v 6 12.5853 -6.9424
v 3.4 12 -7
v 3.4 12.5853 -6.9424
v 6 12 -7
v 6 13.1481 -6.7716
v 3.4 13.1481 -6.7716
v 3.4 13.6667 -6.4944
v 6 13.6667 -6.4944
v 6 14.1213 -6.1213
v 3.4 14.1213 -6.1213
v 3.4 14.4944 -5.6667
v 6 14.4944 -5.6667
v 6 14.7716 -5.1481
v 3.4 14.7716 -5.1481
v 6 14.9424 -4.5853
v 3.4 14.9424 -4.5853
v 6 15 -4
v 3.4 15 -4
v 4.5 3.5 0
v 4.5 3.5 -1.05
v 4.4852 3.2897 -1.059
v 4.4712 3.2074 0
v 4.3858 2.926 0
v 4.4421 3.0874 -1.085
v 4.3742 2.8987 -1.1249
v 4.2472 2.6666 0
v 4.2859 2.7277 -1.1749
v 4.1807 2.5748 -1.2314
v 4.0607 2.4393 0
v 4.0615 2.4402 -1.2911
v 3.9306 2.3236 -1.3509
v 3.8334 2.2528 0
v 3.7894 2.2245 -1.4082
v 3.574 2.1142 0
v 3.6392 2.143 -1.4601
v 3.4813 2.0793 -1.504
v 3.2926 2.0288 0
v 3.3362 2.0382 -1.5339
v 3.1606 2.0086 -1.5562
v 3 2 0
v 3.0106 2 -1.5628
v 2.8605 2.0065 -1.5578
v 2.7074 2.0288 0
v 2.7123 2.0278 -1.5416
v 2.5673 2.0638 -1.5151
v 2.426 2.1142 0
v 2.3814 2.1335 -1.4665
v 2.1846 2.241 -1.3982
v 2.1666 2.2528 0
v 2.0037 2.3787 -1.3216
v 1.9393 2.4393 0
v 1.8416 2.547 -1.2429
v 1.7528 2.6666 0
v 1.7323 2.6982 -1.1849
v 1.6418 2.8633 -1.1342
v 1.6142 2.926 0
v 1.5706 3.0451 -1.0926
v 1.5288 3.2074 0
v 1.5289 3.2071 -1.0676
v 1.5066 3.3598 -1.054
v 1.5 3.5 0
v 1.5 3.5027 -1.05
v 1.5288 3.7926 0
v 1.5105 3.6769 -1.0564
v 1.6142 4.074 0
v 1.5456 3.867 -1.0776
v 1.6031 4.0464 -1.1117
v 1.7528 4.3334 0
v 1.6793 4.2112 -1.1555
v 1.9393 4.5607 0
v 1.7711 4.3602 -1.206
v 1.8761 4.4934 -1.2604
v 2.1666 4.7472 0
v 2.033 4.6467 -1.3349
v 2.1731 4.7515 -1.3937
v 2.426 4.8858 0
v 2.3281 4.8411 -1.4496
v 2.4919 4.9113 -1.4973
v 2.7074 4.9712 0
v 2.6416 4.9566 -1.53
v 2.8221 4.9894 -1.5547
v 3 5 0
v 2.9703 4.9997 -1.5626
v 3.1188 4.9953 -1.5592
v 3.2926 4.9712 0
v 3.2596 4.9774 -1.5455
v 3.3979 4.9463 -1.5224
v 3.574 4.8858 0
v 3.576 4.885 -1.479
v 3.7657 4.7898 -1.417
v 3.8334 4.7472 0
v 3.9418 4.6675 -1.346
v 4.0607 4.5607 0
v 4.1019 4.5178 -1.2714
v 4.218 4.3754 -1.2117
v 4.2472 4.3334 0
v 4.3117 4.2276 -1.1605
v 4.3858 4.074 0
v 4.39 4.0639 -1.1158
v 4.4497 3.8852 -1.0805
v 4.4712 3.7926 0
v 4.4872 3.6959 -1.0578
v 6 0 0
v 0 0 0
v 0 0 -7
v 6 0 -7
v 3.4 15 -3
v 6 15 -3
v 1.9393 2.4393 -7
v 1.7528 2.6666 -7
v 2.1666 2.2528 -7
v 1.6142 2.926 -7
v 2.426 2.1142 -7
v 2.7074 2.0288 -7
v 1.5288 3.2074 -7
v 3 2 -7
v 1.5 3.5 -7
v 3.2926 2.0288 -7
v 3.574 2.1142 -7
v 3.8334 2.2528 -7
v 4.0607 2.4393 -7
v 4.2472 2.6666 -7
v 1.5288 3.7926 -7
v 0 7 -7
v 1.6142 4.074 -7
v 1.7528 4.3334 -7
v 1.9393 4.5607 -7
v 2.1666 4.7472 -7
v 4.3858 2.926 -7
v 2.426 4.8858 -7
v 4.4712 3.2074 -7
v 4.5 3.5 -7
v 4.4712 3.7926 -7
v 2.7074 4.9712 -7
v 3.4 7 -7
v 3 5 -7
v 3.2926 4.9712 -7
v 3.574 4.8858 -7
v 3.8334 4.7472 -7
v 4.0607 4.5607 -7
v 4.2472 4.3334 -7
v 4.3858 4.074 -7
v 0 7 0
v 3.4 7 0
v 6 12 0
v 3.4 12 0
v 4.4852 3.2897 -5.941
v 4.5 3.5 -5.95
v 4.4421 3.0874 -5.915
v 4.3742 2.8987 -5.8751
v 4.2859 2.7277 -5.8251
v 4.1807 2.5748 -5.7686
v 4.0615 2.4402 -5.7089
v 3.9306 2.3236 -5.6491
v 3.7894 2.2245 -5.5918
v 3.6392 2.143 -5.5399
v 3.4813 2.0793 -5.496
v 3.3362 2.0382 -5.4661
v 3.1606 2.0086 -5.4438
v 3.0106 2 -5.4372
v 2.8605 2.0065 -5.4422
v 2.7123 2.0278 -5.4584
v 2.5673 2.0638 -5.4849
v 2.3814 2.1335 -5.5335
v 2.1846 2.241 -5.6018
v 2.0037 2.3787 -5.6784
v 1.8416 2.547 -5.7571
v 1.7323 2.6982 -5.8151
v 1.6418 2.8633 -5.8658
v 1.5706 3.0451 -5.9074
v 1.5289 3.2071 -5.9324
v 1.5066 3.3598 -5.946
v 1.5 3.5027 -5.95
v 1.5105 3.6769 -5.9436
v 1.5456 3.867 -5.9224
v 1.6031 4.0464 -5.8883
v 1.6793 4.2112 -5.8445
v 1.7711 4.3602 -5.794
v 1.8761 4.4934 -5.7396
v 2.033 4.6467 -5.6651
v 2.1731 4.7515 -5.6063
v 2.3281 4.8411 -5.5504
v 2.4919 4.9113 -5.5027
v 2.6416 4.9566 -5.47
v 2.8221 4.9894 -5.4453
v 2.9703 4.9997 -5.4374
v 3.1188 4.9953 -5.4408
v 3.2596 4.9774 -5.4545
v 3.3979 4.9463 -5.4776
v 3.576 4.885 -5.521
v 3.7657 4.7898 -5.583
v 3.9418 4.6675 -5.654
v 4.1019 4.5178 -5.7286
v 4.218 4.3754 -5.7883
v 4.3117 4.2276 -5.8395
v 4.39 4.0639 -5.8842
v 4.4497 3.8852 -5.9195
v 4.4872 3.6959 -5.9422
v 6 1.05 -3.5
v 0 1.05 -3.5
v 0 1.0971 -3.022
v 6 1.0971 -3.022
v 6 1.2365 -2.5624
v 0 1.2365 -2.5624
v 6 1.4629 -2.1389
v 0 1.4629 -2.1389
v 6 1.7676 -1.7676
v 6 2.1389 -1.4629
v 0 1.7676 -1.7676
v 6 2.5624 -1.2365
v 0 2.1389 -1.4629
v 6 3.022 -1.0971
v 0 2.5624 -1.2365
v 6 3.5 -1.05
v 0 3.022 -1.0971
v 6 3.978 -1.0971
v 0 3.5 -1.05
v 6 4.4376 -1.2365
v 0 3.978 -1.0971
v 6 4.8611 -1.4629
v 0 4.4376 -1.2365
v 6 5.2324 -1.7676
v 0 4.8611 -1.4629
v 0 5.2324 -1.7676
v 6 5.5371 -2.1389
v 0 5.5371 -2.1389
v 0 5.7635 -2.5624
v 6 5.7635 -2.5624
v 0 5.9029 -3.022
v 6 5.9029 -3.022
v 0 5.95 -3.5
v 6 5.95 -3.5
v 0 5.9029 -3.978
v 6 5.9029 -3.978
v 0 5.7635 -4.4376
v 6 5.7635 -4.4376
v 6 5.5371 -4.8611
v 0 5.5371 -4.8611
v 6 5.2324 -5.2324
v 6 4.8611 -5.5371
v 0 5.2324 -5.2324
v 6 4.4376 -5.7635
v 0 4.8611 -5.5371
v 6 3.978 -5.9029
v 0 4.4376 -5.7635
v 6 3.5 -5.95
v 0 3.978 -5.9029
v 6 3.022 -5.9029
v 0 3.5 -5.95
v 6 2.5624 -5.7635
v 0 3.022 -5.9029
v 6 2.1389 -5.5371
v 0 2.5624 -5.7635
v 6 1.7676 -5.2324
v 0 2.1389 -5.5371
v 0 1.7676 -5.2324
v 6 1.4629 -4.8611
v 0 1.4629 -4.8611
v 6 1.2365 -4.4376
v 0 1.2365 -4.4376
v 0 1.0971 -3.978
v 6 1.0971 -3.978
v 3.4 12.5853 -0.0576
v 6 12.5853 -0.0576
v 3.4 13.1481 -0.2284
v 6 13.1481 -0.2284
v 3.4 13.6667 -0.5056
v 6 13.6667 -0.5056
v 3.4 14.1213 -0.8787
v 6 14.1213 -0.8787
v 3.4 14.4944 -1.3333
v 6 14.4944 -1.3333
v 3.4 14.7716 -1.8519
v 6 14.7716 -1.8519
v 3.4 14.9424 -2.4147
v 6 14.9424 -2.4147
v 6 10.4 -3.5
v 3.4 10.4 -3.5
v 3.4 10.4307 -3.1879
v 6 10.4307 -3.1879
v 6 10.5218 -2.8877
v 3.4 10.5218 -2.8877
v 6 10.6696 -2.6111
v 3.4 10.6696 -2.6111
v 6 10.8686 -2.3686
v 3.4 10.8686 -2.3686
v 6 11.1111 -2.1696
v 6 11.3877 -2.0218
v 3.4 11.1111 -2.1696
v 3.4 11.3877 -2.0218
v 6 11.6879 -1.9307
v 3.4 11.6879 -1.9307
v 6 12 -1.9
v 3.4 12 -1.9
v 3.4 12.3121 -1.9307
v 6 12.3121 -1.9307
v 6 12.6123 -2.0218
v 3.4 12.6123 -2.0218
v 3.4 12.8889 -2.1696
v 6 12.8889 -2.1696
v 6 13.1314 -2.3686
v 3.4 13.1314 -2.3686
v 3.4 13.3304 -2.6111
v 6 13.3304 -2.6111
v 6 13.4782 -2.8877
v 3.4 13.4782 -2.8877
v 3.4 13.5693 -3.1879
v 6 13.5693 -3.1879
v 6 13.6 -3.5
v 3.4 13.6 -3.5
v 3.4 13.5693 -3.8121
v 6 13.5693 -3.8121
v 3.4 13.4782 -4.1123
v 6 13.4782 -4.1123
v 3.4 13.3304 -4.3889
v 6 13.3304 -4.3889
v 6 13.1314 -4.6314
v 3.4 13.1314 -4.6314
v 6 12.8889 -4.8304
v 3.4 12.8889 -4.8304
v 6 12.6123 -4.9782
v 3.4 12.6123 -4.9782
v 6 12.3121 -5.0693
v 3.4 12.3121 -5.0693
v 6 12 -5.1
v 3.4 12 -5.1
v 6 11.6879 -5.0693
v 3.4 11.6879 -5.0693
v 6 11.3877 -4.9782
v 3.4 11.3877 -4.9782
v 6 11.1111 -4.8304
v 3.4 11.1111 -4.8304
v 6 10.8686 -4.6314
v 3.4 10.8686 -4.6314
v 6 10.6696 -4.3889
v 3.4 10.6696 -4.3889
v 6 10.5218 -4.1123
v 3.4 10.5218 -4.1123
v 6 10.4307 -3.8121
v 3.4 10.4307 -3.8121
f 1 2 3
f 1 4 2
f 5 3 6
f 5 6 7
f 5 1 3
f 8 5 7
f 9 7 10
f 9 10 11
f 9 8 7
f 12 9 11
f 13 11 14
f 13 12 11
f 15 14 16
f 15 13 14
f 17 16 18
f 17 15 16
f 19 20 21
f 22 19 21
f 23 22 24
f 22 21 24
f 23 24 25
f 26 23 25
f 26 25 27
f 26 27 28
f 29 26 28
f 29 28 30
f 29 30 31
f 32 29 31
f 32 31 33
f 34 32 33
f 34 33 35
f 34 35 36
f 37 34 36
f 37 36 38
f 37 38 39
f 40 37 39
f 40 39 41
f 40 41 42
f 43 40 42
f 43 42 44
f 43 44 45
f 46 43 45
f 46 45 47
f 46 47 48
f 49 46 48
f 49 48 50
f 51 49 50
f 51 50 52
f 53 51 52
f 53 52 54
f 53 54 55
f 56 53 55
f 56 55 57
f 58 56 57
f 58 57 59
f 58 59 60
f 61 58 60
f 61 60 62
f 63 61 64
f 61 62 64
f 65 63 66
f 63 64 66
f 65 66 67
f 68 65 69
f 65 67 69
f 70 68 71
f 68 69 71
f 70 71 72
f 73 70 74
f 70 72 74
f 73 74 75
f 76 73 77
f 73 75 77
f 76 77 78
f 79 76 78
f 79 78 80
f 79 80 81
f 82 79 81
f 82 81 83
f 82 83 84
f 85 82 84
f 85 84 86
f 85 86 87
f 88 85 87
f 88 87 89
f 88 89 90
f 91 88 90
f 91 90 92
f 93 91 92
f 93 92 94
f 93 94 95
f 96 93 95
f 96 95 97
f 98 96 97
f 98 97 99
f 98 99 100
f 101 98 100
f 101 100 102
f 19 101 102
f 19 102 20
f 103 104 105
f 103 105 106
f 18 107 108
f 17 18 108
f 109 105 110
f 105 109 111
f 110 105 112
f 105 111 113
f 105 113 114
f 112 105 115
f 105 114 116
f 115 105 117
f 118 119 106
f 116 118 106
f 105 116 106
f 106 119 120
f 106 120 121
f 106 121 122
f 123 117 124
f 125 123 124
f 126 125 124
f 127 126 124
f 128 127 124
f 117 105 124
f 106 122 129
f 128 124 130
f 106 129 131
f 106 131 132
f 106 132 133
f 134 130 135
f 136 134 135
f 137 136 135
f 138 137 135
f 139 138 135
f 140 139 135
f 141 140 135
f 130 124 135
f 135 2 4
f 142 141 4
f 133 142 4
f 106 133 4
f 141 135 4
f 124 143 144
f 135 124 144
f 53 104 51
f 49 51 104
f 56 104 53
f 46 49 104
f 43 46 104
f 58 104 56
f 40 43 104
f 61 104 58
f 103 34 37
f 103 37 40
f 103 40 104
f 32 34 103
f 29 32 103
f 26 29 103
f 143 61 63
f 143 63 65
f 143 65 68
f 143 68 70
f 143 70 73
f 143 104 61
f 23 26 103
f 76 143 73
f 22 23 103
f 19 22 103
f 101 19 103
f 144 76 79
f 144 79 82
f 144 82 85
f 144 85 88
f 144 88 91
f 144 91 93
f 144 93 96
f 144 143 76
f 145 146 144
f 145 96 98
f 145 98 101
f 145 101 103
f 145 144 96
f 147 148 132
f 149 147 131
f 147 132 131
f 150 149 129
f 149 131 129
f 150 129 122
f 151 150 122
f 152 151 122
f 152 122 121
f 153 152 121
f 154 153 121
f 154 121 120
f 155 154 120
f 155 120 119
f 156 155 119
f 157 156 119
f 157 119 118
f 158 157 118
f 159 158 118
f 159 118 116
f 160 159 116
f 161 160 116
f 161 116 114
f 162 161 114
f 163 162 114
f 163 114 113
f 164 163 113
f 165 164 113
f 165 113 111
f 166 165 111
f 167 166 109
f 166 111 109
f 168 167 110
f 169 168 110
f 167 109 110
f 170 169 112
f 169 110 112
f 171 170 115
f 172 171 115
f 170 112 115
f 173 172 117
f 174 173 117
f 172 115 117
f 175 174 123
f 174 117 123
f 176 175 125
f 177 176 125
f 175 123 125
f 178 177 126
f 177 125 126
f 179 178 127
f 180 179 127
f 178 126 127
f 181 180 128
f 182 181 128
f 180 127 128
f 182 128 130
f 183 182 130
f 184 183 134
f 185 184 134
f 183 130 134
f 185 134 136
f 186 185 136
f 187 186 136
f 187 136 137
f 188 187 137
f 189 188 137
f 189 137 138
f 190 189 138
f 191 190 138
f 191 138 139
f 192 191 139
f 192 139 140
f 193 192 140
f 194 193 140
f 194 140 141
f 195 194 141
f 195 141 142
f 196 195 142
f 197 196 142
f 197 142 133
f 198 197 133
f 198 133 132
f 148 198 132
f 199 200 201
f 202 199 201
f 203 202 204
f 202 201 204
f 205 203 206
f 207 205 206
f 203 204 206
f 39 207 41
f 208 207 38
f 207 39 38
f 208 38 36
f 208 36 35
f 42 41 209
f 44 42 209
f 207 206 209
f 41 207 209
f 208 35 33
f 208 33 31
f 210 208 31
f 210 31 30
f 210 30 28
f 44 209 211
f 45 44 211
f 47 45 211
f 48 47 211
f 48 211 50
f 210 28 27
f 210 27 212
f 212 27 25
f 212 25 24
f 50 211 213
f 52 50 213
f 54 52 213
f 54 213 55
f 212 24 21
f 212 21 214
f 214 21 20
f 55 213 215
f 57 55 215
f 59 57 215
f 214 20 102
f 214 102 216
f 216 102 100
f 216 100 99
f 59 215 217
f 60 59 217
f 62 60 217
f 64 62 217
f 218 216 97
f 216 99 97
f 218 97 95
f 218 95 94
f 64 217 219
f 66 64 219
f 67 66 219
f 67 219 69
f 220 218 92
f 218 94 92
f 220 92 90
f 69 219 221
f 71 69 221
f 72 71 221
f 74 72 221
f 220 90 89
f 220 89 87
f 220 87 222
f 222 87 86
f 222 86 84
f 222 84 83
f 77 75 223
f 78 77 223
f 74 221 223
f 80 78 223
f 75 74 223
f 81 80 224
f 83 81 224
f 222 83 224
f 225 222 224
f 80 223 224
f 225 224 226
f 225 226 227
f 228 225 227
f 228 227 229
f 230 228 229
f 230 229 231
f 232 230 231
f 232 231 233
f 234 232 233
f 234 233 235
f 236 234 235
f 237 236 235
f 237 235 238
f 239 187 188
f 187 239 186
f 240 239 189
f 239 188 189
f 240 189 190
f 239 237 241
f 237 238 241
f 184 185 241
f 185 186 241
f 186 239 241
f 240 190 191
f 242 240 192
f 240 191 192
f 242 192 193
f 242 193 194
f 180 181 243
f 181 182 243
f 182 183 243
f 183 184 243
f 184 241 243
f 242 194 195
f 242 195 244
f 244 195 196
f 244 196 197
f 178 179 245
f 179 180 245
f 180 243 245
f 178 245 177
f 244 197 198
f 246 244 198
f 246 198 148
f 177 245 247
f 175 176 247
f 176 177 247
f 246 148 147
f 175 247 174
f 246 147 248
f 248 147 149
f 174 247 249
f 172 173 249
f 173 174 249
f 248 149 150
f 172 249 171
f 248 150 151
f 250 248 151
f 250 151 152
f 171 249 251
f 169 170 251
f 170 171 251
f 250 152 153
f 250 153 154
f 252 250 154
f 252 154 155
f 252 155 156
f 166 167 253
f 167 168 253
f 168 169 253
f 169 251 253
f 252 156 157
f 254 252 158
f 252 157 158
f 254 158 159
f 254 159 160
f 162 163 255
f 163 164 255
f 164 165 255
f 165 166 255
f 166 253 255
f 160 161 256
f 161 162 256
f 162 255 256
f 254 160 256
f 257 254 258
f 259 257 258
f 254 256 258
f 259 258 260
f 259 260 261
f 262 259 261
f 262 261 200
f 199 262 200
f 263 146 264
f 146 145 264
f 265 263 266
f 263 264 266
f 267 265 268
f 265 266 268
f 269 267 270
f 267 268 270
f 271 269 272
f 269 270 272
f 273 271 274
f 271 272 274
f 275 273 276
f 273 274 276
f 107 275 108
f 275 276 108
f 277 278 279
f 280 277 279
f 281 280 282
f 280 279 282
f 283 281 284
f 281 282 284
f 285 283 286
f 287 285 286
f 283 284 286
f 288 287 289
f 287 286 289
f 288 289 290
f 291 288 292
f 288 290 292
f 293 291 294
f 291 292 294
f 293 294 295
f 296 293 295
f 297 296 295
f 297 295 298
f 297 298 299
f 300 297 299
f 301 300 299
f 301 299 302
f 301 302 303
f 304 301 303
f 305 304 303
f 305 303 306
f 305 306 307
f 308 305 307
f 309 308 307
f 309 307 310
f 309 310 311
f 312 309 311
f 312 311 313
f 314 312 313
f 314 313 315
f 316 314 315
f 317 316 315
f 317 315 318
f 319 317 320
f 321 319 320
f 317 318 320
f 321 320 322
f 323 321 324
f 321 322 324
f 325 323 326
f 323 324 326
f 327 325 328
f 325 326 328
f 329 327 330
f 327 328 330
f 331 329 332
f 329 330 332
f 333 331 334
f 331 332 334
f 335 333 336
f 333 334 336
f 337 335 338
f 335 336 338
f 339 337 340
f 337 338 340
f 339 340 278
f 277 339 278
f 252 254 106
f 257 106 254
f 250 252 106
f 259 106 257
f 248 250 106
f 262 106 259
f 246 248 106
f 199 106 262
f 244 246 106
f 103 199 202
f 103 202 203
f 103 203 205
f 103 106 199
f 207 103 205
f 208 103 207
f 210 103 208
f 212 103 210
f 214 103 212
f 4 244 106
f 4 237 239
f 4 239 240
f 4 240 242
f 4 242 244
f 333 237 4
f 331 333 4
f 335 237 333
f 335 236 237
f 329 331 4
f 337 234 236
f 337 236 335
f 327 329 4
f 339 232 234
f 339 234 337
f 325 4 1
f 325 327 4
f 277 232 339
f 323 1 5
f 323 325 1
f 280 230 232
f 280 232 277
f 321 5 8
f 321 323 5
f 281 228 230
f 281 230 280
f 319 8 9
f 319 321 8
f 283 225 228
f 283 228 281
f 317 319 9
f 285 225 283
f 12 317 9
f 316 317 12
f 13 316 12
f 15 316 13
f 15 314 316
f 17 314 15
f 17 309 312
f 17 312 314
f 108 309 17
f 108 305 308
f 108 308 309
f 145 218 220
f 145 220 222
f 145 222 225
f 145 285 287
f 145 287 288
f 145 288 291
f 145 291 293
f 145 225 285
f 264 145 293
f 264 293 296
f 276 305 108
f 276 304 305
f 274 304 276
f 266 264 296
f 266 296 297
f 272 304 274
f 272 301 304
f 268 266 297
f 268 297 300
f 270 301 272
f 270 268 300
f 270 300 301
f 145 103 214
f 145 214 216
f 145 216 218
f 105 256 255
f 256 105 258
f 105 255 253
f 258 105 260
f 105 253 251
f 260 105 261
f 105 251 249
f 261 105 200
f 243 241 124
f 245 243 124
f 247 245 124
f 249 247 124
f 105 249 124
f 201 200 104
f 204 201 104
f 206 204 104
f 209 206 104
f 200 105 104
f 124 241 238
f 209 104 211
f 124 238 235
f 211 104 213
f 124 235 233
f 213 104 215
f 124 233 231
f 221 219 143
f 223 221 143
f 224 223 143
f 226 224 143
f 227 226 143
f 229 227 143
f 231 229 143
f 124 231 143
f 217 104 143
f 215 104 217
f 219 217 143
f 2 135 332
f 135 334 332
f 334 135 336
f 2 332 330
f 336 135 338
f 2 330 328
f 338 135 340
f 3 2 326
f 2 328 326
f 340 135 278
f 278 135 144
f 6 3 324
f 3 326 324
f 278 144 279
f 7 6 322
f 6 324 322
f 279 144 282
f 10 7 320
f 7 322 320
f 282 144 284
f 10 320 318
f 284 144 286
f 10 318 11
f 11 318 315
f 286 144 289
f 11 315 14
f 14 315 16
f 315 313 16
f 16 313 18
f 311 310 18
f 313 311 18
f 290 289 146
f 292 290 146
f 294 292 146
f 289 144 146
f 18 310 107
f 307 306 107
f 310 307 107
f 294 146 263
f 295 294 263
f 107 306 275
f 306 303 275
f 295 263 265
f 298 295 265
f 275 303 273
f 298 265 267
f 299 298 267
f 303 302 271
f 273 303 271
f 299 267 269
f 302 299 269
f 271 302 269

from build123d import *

# Parameters (mm, degrees)
F0_W      = 6
F0_H      = 15
F1_DEPTH  = 7
F2_W      = 3.4
F2_H      = 8
F3_DEPTH  = 25
F4_R      = 3
F5_R      = 2.45
F6_DEPTH  = 25
F7_R      = 1.6
F8_DEPTH  = 25
F9_R      = 1.5
F10_DEPTH = 25


with BuildPart() as f1:
    # F0 (on Top) → F1 (new body)
    with BuildSketch(Plane.XY):
        with Locations((3, 7.5)):
            Rectangle(F0_W, F0_H)
    extrude(amount=-F1_DEPTH)

    # F2 (on face) → F3 (cut)
    with BuildSketch(Plane.XY):
        with Locations((1.7, 11)):
            Rectangle(F2_W, F2_H)
    extrude(amount=-F3_DEPTH, mode=Mode.SUBTRACT)

    # F4
    f4_edges = [f1.edges().sort_by_distance(p)[0] for p in [
        (4.7, 15, 0),
        (4.7, 15, -7),
    ]]
    fillet(f4_edges, radius=F4_R)

    # F5 (on face) → F6 (cut)
    with BuildSketch(Plane(origin=(0, 0, 0), x_dir=(0, -1, 0), z_dir=(-1, 0, 0))):
        with Locations((-3.5, -3.5)):
            Circle(F5_R)
    extrude(amount=-F6_DEPTH, mode=Mode.SUBTRACT)

    # F7 (on face) → F8 (cut)
    with BuildSketch(Plane(origin=(3.4, 0, 0), x_dir=(0, -1, 0), z_dir=(-1, 0, 0))):
        with Locations((-12, -3.5)):
            Circle(F7_R)
    extrude(amount=-F8_DEPTH, mode=Mode.SUBTRACT)

    # F9 (on face) → F10 (cut)
    with BuildSketch(Plane(origin=(0, 0, -7), x_dir=(1, 0, 0), z_dir=(0, 0, -1))):
        with Locations((3, -3.5)):
            Circle(F9_R)
    extrude(amount=-F10_DEPTH, mode=Mode.SUBTRACT)


solid = f1.part
